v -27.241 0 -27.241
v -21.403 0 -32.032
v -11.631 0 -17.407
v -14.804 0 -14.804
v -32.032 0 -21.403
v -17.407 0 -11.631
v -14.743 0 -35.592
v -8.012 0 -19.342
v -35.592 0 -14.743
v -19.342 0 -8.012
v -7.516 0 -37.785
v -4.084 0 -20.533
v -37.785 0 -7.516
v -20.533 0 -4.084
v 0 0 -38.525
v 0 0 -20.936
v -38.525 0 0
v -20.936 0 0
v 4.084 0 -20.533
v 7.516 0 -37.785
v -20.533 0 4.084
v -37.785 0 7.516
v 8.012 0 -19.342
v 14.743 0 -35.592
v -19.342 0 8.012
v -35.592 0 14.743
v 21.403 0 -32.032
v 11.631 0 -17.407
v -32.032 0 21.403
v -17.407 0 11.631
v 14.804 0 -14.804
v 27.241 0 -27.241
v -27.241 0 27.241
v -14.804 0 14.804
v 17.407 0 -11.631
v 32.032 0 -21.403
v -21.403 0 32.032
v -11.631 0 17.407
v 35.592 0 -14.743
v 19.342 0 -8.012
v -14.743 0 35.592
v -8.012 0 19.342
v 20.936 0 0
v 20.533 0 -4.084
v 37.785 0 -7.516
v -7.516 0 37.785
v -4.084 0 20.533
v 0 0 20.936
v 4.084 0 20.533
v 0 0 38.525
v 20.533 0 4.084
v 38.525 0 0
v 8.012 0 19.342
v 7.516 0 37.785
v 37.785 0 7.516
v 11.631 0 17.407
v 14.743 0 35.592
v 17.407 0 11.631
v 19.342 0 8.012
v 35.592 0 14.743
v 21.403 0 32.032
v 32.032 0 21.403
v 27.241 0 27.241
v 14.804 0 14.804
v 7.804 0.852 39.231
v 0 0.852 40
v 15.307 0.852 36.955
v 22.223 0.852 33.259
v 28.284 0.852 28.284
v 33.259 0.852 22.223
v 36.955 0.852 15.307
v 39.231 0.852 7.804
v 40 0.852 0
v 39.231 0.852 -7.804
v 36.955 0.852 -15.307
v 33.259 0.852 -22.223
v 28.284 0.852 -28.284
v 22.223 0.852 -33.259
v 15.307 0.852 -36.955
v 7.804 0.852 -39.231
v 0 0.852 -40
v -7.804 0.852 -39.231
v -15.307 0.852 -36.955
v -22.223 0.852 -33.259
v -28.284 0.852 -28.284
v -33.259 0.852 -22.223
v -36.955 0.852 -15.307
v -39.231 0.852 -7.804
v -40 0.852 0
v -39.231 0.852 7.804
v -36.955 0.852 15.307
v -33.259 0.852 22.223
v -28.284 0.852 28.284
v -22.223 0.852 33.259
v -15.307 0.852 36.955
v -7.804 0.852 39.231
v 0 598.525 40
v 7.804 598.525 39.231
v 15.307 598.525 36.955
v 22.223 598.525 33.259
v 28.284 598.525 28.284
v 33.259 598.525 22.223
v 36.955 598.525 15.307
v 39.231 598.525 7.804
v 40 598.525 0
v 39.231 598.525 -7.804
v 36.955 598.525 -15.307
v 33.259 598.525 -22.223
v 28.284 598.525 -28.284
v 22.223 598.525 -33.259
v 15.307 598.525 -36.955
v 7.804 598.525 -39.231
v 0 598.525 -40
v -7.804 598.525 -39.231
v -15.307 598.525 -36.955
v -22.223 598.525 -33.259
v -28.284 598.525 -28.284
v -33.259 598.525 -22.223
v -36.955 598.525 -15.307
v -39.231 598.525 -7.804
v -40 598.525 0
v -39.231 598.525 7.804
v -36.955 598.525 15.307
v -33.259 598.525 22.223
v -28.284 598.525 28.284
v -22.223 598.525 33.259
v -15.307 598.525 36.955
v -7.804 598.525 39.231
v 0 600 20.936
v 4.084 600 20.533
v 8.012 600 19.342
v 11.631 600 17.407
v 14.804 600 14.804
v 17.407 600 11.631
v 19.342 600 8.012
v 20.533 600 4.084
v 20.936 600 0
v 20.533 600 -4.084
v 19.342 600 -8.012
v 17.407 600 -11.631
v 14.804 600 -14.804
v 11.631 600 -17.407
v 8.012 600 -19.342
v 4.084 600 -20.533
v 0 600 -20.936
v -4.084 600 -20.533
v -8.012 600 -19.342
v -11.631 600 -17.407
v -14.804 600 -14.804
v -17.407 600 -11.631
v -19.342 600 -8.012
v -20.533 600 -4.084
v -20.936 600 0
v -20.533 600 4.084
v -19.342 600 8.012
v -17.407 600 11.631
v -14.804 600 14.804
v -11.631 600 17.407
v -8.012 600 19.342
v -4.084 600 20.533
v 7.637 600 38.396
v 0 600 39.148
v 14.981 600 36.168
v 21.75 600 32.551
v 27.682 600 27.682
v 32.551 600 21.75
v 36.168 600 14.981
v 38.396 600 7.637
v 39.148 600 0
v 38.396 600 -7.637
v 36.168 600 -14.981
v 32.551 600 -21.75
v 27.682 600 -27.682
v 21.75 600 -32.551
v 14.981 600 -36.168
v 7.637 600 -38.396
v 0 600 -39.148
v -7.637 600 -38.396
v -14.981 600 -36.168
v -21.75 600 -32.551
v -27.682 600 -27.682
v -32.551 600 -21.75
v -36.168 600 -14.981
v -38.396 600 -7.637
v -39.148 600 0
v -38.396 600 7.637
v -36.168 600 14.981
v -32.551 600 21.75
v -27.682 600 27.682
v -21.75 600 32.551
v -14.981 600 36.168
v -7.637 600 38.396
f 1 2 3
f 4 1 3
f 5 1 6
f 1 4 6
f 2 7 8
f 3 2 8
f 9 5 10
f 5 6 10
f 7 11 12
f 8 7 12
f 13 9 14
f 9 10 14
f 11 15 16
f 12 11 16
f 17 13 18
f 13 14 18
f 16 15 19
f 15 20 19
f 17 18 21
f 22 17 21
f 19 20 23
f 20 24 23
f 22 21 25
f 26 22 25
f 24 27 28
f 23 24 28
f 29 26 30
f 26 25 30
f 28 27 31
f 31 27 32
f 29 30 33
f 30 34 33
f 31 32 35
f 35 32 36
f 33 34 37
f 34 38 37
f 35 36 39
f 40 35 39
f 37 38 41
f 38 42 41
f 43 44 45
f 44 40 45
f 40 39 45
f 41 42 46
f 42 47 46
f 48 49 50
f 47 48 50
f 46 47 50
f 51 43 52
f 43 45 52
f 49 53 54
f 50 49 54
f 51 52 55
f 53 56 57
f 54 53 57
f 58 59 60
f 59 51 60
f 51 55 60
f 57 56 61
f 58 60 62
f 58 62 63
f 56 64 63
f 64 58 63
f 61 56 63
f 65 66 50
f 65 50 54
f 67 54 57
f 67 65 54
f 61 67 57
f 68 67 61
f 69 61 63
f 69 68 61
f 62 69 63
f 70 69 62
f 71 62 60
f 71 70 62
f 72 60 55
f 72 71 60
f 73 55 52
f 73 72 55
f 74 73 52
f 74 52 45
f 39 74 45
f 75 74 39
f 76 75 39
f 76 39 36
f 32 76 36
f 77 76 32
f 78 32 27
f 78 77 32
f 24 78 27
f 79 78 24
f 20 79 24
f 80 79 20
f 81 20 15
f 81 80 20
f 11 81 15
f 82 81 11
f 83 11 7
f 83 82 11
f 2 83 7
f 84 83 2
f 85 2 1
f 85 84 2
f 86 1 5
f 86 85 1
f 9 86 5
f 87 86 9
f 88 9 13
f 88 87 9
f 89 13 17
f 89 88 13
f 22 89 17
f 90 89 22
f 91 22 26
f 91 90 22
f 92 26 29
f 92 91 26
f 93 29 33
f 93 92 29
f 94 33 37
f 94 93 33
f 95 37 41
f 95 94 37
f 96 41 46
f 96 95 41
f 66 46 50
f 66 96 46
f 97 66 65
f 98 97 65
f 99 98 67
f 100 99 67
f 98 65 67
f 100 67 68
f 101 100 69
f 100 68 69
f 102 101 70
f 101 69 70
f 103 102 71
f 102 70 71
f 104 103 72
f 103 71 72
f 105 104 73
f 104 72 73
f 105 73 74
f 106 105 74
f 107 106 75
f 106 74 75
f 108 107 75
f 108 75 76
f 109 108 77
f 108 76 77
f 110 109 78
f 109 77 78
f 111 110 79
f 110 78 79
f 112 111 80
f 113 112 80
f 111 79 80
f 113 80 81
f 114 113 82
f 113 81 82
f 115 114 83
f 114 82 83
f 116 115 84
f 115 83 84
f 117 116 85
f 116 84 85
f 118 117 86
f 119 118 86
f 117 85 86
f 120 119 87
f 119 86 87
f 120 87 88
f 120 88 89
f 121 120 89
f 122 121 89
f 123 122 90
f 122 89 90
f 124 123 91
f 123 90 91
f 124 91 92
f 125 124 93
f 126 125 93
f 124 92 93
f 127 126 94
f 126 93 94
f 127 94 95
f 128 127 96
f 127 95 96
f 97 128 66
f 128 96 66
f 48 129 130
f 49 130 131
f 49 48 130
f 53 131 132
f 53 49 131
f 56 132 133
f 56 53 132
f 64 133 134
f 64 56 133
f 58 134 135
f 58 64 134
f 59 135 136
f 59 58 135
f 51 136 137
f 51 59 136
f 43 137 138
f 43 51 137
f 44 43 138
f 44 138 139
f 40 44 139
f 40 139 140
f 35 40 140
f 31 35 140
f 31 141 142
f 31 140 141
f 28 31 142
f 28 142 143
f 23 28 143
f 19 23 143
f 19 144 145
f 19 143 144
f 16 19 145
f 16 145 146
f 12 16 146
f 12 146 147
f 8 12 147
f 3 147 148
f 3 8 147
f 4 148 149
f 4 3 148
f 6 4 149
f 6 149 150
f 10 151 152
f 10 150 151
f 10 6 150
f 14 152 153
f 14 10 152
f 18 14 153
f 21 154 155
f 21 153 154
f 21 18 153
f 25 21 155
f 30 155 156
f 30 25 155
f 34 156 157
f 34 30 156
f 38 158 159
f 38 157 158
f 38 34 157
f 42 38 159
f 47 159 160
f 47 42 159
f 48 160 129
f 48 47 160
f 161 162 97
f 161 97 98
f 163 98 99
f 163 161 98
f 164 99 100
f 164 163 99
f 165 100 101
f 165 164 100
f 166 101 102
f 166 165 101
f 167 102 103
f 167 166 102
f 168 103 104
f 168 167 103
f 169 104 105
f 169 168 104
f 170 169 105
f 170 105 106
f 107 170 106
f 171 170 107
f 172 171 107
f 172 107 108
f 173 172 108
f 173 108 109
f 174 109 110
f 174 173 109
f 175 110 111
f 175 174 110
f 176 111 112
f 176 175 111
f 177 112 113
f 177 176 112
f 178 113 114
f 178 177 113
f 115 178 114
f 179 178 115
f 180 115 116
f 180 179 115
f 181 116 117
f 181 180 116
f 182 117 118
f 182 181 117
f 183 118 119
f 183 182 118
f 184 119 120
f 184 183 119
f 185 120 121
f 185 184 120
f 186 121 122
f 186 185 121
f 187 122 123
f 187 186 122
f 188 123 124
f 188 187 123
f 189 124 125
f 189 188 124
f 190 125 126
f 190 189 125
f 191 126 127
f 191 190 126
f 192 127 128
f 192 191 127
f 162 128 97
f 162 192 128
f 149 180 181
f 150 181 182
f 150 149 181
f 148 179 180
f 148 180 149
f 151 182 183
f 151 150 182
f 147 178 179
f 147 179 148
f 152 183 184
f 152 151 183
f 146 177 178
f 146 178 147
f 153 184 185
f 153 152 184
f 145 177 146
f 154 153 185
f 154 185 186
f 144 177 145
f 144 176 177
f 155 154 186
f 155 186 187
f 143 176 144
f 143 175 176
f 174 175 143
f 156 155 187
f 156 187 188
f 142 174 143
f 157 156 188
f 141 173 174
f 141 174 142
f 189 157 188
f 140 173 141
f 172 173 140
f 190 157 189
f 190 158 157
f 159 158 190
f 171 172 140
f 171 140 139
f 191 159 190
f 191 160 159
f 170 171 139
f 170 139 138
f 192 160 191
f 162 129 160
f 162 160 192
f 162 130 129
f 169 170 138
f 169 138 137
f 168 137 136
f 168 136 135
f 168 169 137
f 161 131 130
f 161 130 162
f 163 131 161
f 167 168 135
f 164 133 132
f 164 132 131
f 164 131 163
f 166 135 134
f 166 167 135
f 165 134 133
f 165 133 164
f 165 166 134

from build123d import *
from OCP.BRepFilletAPI import BRepFilletAPI_MakeChamfer

# Parameters (mm, degrees)
SKETCH1_R           = 40
BOSS_EXTRUDE1_DEPTH = 600
SKETCH2_R           = 20.935503309
CUT_EXTRUDE1_DEPTH  = 603.660766933
CHAMFER1_SIZE       = 1.475150673
CHAMFER1_SIZE2      = 0.851678638


with BuildPart() as part:
    # Sketch1 → Boss-Extrude1 (new body)
    with BuildSketch(Plane(origin=(0, 0, 0), x_dir=(1, 0, 0), z_dir=(0, 1, 0))):
        Circle(SKETCH1_R)
    extrude(amount=BOSS_EXTRUDE1_DEPTH)

    # Sketch2 → Cut-Extrude1 (cut, through all)
    with BuildSketch(Plane(origin=(0, 0, 0), x_dir=(1, 0, 0), z_dir=(0, 1, 0))):
        Circle(SKETCH2_R)
    extrude(amount=CUT_EXTRUDE1_DEPTH, mode=Mode.SUBTRACT)

    # Chamfer1: one chamfer whose edges measure the first distance from different faces: ONE call of the kernel's chamfer builder (chamfer() names one face for all edges)
    chamfer1_edges_1 = [part.edges().sort_by_distance(p)[0] for p in [
        (-40, 600, 0),
    ]]
    chamfer1_side_1 = [part.faces().sort_by_distance(p)[0] for p in [
        (-40, 300, 0),
    ]]
    chamfer1_edges_2 = [part.edges().sort_by_distance(p)[0] for p in [
        (-40, 0, 0),
    ]]
    chamfer1_side_2 = [part.faces().sort_by_distance(p)[0] for p in [
        (-38.86862915, 0, 0),
    ]]
    chamfer1 = BRepFilletAPI_MakeChamfer(part.part.solid().wrapped)
    for e in chamfer1_edges_1:
        chamfer1.Add(CHAMFER1_SIZE, CHAMFER1_SIZE2, e.wrapped, chamfer1_side_1[0].wrapped)  # the first distance lies on this face
    for e in chamfer1_edges_2:
        chamfer1.Add(CHAMFER1_SIZE, CHAMFER1_SIZE2, e.wrapped, chamfer1_side_2[0].wrapped)  # the first distance lies on this face
    add(Compound.cast(chamfer1.Shape()), mode=Mode.REPLACE)


solid = part.part
